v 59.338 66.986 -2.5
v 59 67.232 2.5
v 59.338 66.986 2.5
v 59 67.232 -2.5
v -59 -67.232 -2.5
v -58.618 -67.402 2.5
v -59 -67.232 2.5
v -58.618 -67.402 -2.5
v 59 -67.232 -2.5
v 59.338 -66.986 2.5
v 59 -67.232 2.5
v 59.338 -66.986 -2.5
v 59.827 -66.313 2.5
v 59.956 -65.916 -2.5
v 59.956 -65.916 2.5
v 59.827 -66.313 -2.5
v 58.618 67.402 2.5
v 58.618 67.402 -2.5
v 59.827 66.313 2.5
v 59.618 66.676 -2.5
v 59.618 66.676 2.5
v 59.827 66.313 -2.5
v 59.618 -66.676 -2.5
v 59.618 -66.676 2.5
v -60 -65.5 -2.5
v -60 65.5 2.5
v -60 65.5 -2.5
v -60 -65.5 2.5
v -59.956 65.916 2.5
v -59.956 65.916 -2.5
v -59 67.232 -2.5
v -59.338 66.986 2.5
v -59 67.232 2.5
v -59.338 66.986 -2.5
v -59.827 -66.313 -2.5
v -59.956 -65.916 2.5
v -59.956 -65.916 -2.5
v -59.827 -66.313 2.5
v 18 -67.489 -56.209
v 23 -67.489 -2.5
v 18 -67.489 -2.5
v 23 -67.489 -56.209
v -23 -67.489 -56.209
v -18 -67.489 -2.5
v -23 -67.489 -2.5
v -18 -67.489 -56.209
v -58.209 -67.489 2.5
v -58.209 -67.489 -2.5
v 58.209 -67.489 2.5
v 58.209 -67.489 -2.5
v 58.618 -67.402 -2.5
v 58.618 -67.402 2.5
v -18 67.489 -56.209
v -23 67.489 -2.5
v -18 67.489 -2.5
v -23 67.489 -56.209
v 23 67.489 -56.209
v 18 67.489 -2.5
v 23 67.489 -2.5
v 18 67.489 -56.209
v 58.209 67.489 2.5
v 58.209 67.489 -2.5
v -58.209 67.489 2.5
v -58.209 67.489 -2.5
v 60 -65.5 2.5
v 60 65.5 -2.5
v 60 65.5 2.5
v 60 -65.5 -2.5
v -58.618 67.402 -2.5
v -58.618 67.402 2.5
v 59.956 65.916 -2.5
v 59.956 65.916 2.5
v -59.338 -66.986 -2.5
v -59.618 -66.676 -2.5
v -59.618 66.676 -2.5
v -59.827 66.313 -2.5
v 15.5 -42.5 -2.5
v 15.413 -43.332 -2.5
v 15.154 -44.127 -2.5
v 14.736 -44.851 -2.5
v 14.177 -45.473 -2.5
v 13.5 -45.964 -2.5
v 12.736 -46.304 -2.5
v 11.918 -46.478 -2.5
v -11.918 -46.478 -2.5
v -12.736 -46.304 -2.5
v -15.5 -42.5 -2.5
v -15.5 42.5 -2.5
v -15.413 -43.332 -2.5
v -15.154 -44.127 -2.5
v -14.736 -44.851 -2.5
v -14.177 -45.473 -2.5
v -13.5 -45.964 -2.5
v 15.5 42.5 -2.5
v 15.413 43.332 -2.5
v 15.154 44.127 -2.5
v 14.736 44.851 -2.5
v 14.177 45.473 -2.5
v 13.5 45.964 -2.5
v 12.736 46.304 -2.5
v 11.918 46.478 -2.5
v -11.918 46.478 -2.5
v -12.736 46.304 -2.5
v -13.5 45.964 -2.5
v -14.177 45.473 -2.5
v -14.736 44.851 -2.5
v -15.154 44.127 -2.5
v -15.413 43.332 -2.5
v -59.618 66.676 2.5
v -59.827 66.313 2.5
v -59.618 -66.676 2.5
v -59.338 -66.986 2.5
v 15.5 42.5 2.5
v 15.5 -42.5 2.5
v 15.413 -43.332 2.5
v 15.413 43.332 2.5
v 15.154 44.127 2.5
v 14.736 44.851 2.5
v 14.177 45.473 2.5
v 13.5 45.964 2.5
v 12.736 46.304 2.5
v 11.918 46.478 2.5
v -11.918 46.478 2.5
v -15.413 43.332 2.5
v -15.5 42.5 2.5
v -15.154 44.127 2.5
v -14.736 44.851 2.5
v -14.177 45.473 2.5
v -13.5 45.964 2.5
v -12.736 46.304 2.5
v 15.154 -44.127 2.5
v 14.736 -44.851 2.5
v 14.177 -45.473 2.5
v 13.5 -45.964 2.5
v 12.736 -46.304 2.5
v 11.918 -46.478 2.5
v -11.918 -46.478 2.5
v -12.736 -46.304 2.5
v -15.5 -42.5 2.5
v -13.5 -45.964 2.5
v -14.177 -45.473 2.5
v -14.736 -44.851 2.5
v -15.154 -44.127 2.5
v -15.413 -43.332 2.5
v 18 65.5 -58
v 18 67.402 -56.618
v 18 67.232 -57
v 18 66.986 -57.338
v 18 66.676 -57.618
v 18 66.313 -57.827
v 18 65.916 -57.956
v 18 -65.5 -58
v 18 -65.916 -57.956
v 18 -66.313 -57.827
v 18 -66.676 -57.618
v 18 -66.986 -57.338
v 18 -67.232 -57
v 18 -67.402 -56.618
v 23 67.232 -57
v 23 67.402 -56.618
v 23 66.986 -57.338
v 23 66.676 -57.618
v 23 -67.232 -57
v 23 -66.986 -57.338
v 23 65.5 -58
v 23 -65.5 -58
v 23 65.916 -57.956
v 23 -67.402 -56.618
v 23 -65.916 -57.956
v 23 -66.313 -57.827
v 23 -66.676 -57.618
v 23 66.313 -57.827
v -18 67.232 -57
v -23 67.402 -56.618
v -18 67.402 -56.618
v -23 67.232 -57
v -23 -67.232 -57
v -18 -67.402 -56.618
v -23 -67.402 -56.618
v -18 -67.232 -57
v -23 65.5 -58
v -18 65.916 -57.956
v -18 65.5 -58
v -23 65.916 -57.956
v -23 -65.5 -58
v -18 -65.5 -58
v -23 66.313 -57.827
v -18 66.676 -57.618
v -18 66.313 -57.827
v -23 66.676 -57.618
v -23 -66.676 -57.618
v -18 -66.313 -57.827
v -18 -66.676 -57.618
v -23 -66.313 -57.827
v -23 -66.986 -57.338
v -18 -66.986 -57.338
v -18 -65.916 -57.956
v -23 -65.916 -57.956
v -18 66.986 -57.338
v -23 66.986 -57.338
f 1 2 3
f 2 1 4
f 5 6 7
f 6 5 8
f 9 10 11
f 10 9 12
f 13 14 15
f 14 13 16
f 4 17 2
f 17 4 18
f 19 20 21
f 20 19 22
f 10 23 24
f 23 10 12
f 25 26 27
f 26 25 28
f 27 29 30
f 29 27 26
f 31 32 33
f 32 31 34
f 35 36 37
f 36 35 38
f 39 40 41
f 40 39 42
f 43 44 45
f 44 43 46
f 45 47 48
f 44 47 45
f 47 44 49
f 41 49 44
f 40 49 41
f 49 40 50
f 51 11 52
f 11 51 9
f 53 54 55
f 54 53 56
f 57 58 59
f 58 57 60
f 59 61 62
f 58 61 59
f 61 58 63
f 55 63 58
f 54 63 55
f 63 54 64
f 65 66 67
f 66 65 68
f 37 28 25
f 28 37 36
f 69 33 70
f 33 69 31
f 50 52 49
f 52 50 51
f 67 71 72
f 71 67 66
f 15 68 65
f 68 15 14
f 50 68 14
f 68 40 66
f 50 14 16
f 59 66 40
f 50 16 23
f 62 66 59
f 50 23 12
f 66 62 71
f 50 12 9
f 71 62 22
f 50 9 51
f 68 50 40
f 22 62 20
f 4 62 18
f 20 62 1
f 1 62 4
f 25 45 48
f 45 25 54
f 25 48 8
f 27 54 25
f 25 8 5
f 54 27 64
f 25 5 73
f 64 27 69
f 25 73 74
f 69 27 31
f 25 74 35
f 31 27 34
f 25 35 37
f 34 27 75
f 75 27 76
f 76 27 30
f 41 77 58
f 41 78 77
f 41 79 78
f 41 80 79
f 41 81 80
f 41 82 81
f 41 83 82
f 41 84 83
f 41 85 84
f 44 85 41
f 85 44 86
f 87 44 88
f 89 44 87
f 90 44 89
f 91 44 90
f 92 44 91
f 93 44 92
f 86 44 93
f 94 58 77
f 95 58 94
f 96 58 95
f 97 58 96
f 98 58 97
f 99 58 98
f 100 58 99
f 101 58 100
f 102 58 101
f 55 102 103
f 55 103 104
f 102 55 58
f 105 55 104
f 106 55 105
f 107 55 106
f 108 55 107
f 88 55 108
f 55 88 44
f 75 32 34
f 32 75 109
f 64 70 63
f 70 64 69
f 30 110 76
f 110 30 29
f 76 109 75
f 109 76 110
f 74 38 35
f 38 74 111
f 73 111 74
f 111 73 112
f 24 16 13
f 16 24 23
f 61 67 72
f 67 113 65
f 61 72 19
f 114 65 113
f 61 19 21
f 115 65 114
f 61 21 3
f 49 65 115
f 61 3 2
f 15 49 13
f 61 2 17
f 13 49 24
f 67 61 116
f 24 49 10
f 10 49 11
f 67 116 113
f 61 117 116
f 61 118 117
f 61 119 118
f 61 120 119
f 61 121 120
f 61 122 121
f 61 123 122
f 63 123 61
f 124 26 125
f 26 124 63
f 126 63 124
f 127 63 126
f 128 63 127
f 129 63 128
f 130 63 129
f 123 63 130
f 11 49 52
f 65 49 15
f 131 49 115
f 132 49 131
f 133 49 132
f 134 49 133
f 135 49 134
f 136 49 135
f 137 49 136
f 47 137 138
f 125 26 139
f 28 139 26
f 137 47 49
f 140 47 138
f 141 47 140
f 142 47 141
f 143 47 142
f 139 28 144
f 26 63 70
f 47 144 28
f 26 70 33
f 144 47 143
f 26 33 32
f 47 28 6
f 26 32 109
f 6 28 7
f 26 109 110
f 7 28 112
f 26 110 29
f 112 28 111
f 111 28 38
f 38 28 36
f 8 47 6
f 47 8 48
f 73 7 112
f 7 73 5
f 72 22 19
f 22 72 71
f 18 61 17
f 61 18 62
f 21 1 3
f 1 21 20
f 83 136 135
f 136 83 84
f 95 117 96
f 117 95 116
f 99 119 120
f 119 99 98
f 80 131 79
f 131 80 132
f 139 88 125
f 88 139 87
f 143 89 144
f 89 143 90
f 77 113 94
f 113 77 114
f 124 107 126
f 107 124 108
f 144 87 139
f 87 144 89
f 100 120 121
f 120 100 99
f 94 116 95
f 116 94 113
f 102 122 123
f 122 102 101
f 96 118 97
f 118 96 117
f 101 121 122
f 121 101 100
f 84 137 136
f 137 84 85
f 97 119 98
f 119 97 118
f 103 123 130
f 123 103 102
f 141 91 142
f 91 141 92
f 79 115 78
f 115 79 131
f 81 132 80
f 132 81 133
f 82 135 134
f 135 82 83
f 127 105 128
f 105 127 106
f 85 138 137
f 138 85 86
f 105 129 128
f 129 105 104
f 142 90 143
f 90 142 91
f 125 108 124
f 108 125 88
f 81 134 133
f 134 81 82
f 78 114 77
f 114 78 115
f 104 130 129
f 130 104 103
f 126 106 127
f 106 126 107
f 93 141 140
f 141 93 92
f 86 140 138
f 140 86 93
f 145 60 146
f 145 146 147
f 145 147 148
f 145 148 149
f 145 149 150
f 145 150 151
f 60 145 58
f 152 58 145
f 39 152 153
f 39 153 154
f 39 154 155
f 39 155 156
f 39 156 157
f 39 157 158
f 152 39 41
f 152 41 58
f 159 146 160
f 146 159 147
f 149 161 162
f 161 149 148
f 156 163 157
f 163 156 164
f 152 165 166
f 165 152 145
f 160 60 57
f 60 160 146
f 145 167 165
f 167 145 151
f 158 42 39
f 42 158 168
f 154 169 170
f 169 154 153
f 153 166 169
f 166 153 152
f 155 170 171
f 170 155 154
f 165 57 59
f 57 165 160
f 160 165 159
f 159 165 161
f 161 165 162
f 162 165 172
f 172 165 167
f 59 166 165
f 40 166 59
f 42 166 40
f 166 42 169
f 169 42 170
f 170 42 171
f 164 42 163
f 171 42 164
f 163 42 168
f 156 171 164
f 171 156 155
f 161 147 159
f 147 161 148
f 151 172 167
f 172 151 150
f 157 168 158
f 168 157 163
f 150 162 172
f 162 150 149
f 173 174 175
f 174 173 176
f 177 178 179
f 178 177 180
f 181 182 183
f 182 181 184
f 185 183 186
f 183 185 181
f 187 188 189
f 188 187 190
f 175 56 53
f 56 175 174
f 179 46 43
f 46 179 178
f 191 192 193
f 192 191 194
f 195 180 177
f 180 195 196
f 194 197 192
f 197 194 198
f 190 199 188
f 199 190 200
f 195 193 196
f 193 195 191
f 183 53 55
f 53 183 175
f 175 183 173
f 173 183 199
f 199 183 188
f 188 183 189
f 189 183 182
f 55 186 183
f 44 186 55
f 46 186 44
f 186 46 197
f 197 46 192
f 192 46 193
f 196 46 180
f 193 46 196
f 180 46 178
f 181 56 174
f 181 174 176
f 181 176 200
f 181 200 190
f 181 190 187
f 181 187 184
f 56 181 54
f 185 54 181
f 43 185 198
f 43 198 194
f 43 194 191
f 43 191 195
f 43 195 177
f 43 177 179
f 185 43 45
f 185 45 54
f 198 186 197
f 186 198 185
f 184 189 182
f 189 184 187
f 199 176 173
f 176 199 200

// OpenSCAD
$fn = 30;

//	in		mm
//	.25		6.35
//	.62		16 mm
//	.47		12 mm
//

rBitSize = 12;			// Size of bit Cut mm
rBitCollorSize = 16;		// Size of outer collor size mm

wOffsetForCollor = rBitCollorSize - rBitSize;
wCornerRadious = rBitCollorSize/2;

iecDepth = 61;
iecWidth = 29;
iecMiddleWidth = 51;

doorHangerCutout();

// door width 35mm

% translate([0, 0, -21]) cube([35, 200, 40], center=true); // Door Blank

//projection(cut=false) 
//	outterCutout();

//innerCutout();

//translate([0,0,-5.05]) plate4Point(150,150,.4,70); // for extra hold to the bed.

module doorHangerCutout(){
	
	doorWidth = 35;
	
	difference(){
		backPlate();
		outterShell(27, 27, 89, 10);
	}
	 translate([doorWidth/2 + 3, 0, -28]) rotate([0, 90, 0]) plate4Point(60,135,5,4);
	 mirror([90, 0, 0])
		translate([doorWidth/2 + 3, 0, -28]) rotate([0, 90, 0]) plate4Point(60,135,5,4);
}


module sightLine(w){

	rotate([180,0,0]){
		hull(){
			translate([0,w/2,0]) cylinder(h=15, r1=10, r2=0, center=true);
			translate([0,-w/2,0]) cylinder(h=15, r1=10, r2=0, center=true);
		}
	}
}

module outterCutout(){
	difference(){
		backPlate();
		outterShell(iecWidth, iecMiddleWidth, iecDepth, 10);
	}
}

module innerCutout(){
	difference(){
		union(){
			backPlate();
			translate([0,0,.8]) outterShell(iecWidth - wOffsetForCollor, iecMiddleWidth - wOffsetForCollor, iecDepth - wOffsetForCollor, 5);
//			translate([0,0,1]) outterShell(iecWidth, iecMiddleWidth, iecDepth, 5);
		}
		innerShell(20);
	}
}

module backPlate(){
//	difference(){
		plate4Point(120,135,5,4);
//		translate([0,50,4.5]) sightLine(20);
//		translate([0,-50,4.5]) sightLine(20);
//		translate([42,0,4.5]) rotate([0,0,90]) sightLine(20);
//		translate([-42,0,4.5]) rotate([0,0,90]) sightLine(20);
//	}
}

module outterShell(wt, wm, h, depth){

	cSidesX = 	wt	+ wOffsetForCollor; // 29
	cMiddleX = 	wm	+ wOffsetForCollor; // 51
	cSideY = 		h		+ wOffsetForCollor; // 61
	
	hull(){
		plate4Point(cSidesX, cSideY, depth, wCornerRadious);
		plate2Point(cMiddleX, depth, wCornerRadious);
	}
}

module innerShell(depth){

	cSidesX = 27	+ wOffsetForCollor;
	cSideY = 47		+ wOffsetForCollor;
	
	plate4Point(cSidesX,cSideY, depth, wCornerRadious);
}

module plate2Point(x,z,d){
	hull(){
		color("green") translate([(x/2) -(d/2), 0, 0]) cylinder(h=z, d=d, center=true);
		color("blue")  translate([-(x/2)+(d/2), 0, 0]) cylinder(h=z, d=d, center=true);
	}
}

module plate4Point(x,y,z,d){
	hull(){
		color("green") translate([(x/2)-(d/2) ,(y/2) -(d/2),0]) cylinder(h=z, d=d, center=true);
		color("blue")  translate([(x/2)-(d/2) ,-(y/2)+(d/2),0]) cylinder(h=z, d=d, center=true);
		color("red")   translate([-(x/2)+(d/2),(y/2) -(d/2),0]) cylinder(h=z, d=d, center=true);
		color("grey")  translate([-(x/2)+(d/2),-(y/2)+(d/2),0]) cylinder(h=z, d=d, center=true);
	}
}
